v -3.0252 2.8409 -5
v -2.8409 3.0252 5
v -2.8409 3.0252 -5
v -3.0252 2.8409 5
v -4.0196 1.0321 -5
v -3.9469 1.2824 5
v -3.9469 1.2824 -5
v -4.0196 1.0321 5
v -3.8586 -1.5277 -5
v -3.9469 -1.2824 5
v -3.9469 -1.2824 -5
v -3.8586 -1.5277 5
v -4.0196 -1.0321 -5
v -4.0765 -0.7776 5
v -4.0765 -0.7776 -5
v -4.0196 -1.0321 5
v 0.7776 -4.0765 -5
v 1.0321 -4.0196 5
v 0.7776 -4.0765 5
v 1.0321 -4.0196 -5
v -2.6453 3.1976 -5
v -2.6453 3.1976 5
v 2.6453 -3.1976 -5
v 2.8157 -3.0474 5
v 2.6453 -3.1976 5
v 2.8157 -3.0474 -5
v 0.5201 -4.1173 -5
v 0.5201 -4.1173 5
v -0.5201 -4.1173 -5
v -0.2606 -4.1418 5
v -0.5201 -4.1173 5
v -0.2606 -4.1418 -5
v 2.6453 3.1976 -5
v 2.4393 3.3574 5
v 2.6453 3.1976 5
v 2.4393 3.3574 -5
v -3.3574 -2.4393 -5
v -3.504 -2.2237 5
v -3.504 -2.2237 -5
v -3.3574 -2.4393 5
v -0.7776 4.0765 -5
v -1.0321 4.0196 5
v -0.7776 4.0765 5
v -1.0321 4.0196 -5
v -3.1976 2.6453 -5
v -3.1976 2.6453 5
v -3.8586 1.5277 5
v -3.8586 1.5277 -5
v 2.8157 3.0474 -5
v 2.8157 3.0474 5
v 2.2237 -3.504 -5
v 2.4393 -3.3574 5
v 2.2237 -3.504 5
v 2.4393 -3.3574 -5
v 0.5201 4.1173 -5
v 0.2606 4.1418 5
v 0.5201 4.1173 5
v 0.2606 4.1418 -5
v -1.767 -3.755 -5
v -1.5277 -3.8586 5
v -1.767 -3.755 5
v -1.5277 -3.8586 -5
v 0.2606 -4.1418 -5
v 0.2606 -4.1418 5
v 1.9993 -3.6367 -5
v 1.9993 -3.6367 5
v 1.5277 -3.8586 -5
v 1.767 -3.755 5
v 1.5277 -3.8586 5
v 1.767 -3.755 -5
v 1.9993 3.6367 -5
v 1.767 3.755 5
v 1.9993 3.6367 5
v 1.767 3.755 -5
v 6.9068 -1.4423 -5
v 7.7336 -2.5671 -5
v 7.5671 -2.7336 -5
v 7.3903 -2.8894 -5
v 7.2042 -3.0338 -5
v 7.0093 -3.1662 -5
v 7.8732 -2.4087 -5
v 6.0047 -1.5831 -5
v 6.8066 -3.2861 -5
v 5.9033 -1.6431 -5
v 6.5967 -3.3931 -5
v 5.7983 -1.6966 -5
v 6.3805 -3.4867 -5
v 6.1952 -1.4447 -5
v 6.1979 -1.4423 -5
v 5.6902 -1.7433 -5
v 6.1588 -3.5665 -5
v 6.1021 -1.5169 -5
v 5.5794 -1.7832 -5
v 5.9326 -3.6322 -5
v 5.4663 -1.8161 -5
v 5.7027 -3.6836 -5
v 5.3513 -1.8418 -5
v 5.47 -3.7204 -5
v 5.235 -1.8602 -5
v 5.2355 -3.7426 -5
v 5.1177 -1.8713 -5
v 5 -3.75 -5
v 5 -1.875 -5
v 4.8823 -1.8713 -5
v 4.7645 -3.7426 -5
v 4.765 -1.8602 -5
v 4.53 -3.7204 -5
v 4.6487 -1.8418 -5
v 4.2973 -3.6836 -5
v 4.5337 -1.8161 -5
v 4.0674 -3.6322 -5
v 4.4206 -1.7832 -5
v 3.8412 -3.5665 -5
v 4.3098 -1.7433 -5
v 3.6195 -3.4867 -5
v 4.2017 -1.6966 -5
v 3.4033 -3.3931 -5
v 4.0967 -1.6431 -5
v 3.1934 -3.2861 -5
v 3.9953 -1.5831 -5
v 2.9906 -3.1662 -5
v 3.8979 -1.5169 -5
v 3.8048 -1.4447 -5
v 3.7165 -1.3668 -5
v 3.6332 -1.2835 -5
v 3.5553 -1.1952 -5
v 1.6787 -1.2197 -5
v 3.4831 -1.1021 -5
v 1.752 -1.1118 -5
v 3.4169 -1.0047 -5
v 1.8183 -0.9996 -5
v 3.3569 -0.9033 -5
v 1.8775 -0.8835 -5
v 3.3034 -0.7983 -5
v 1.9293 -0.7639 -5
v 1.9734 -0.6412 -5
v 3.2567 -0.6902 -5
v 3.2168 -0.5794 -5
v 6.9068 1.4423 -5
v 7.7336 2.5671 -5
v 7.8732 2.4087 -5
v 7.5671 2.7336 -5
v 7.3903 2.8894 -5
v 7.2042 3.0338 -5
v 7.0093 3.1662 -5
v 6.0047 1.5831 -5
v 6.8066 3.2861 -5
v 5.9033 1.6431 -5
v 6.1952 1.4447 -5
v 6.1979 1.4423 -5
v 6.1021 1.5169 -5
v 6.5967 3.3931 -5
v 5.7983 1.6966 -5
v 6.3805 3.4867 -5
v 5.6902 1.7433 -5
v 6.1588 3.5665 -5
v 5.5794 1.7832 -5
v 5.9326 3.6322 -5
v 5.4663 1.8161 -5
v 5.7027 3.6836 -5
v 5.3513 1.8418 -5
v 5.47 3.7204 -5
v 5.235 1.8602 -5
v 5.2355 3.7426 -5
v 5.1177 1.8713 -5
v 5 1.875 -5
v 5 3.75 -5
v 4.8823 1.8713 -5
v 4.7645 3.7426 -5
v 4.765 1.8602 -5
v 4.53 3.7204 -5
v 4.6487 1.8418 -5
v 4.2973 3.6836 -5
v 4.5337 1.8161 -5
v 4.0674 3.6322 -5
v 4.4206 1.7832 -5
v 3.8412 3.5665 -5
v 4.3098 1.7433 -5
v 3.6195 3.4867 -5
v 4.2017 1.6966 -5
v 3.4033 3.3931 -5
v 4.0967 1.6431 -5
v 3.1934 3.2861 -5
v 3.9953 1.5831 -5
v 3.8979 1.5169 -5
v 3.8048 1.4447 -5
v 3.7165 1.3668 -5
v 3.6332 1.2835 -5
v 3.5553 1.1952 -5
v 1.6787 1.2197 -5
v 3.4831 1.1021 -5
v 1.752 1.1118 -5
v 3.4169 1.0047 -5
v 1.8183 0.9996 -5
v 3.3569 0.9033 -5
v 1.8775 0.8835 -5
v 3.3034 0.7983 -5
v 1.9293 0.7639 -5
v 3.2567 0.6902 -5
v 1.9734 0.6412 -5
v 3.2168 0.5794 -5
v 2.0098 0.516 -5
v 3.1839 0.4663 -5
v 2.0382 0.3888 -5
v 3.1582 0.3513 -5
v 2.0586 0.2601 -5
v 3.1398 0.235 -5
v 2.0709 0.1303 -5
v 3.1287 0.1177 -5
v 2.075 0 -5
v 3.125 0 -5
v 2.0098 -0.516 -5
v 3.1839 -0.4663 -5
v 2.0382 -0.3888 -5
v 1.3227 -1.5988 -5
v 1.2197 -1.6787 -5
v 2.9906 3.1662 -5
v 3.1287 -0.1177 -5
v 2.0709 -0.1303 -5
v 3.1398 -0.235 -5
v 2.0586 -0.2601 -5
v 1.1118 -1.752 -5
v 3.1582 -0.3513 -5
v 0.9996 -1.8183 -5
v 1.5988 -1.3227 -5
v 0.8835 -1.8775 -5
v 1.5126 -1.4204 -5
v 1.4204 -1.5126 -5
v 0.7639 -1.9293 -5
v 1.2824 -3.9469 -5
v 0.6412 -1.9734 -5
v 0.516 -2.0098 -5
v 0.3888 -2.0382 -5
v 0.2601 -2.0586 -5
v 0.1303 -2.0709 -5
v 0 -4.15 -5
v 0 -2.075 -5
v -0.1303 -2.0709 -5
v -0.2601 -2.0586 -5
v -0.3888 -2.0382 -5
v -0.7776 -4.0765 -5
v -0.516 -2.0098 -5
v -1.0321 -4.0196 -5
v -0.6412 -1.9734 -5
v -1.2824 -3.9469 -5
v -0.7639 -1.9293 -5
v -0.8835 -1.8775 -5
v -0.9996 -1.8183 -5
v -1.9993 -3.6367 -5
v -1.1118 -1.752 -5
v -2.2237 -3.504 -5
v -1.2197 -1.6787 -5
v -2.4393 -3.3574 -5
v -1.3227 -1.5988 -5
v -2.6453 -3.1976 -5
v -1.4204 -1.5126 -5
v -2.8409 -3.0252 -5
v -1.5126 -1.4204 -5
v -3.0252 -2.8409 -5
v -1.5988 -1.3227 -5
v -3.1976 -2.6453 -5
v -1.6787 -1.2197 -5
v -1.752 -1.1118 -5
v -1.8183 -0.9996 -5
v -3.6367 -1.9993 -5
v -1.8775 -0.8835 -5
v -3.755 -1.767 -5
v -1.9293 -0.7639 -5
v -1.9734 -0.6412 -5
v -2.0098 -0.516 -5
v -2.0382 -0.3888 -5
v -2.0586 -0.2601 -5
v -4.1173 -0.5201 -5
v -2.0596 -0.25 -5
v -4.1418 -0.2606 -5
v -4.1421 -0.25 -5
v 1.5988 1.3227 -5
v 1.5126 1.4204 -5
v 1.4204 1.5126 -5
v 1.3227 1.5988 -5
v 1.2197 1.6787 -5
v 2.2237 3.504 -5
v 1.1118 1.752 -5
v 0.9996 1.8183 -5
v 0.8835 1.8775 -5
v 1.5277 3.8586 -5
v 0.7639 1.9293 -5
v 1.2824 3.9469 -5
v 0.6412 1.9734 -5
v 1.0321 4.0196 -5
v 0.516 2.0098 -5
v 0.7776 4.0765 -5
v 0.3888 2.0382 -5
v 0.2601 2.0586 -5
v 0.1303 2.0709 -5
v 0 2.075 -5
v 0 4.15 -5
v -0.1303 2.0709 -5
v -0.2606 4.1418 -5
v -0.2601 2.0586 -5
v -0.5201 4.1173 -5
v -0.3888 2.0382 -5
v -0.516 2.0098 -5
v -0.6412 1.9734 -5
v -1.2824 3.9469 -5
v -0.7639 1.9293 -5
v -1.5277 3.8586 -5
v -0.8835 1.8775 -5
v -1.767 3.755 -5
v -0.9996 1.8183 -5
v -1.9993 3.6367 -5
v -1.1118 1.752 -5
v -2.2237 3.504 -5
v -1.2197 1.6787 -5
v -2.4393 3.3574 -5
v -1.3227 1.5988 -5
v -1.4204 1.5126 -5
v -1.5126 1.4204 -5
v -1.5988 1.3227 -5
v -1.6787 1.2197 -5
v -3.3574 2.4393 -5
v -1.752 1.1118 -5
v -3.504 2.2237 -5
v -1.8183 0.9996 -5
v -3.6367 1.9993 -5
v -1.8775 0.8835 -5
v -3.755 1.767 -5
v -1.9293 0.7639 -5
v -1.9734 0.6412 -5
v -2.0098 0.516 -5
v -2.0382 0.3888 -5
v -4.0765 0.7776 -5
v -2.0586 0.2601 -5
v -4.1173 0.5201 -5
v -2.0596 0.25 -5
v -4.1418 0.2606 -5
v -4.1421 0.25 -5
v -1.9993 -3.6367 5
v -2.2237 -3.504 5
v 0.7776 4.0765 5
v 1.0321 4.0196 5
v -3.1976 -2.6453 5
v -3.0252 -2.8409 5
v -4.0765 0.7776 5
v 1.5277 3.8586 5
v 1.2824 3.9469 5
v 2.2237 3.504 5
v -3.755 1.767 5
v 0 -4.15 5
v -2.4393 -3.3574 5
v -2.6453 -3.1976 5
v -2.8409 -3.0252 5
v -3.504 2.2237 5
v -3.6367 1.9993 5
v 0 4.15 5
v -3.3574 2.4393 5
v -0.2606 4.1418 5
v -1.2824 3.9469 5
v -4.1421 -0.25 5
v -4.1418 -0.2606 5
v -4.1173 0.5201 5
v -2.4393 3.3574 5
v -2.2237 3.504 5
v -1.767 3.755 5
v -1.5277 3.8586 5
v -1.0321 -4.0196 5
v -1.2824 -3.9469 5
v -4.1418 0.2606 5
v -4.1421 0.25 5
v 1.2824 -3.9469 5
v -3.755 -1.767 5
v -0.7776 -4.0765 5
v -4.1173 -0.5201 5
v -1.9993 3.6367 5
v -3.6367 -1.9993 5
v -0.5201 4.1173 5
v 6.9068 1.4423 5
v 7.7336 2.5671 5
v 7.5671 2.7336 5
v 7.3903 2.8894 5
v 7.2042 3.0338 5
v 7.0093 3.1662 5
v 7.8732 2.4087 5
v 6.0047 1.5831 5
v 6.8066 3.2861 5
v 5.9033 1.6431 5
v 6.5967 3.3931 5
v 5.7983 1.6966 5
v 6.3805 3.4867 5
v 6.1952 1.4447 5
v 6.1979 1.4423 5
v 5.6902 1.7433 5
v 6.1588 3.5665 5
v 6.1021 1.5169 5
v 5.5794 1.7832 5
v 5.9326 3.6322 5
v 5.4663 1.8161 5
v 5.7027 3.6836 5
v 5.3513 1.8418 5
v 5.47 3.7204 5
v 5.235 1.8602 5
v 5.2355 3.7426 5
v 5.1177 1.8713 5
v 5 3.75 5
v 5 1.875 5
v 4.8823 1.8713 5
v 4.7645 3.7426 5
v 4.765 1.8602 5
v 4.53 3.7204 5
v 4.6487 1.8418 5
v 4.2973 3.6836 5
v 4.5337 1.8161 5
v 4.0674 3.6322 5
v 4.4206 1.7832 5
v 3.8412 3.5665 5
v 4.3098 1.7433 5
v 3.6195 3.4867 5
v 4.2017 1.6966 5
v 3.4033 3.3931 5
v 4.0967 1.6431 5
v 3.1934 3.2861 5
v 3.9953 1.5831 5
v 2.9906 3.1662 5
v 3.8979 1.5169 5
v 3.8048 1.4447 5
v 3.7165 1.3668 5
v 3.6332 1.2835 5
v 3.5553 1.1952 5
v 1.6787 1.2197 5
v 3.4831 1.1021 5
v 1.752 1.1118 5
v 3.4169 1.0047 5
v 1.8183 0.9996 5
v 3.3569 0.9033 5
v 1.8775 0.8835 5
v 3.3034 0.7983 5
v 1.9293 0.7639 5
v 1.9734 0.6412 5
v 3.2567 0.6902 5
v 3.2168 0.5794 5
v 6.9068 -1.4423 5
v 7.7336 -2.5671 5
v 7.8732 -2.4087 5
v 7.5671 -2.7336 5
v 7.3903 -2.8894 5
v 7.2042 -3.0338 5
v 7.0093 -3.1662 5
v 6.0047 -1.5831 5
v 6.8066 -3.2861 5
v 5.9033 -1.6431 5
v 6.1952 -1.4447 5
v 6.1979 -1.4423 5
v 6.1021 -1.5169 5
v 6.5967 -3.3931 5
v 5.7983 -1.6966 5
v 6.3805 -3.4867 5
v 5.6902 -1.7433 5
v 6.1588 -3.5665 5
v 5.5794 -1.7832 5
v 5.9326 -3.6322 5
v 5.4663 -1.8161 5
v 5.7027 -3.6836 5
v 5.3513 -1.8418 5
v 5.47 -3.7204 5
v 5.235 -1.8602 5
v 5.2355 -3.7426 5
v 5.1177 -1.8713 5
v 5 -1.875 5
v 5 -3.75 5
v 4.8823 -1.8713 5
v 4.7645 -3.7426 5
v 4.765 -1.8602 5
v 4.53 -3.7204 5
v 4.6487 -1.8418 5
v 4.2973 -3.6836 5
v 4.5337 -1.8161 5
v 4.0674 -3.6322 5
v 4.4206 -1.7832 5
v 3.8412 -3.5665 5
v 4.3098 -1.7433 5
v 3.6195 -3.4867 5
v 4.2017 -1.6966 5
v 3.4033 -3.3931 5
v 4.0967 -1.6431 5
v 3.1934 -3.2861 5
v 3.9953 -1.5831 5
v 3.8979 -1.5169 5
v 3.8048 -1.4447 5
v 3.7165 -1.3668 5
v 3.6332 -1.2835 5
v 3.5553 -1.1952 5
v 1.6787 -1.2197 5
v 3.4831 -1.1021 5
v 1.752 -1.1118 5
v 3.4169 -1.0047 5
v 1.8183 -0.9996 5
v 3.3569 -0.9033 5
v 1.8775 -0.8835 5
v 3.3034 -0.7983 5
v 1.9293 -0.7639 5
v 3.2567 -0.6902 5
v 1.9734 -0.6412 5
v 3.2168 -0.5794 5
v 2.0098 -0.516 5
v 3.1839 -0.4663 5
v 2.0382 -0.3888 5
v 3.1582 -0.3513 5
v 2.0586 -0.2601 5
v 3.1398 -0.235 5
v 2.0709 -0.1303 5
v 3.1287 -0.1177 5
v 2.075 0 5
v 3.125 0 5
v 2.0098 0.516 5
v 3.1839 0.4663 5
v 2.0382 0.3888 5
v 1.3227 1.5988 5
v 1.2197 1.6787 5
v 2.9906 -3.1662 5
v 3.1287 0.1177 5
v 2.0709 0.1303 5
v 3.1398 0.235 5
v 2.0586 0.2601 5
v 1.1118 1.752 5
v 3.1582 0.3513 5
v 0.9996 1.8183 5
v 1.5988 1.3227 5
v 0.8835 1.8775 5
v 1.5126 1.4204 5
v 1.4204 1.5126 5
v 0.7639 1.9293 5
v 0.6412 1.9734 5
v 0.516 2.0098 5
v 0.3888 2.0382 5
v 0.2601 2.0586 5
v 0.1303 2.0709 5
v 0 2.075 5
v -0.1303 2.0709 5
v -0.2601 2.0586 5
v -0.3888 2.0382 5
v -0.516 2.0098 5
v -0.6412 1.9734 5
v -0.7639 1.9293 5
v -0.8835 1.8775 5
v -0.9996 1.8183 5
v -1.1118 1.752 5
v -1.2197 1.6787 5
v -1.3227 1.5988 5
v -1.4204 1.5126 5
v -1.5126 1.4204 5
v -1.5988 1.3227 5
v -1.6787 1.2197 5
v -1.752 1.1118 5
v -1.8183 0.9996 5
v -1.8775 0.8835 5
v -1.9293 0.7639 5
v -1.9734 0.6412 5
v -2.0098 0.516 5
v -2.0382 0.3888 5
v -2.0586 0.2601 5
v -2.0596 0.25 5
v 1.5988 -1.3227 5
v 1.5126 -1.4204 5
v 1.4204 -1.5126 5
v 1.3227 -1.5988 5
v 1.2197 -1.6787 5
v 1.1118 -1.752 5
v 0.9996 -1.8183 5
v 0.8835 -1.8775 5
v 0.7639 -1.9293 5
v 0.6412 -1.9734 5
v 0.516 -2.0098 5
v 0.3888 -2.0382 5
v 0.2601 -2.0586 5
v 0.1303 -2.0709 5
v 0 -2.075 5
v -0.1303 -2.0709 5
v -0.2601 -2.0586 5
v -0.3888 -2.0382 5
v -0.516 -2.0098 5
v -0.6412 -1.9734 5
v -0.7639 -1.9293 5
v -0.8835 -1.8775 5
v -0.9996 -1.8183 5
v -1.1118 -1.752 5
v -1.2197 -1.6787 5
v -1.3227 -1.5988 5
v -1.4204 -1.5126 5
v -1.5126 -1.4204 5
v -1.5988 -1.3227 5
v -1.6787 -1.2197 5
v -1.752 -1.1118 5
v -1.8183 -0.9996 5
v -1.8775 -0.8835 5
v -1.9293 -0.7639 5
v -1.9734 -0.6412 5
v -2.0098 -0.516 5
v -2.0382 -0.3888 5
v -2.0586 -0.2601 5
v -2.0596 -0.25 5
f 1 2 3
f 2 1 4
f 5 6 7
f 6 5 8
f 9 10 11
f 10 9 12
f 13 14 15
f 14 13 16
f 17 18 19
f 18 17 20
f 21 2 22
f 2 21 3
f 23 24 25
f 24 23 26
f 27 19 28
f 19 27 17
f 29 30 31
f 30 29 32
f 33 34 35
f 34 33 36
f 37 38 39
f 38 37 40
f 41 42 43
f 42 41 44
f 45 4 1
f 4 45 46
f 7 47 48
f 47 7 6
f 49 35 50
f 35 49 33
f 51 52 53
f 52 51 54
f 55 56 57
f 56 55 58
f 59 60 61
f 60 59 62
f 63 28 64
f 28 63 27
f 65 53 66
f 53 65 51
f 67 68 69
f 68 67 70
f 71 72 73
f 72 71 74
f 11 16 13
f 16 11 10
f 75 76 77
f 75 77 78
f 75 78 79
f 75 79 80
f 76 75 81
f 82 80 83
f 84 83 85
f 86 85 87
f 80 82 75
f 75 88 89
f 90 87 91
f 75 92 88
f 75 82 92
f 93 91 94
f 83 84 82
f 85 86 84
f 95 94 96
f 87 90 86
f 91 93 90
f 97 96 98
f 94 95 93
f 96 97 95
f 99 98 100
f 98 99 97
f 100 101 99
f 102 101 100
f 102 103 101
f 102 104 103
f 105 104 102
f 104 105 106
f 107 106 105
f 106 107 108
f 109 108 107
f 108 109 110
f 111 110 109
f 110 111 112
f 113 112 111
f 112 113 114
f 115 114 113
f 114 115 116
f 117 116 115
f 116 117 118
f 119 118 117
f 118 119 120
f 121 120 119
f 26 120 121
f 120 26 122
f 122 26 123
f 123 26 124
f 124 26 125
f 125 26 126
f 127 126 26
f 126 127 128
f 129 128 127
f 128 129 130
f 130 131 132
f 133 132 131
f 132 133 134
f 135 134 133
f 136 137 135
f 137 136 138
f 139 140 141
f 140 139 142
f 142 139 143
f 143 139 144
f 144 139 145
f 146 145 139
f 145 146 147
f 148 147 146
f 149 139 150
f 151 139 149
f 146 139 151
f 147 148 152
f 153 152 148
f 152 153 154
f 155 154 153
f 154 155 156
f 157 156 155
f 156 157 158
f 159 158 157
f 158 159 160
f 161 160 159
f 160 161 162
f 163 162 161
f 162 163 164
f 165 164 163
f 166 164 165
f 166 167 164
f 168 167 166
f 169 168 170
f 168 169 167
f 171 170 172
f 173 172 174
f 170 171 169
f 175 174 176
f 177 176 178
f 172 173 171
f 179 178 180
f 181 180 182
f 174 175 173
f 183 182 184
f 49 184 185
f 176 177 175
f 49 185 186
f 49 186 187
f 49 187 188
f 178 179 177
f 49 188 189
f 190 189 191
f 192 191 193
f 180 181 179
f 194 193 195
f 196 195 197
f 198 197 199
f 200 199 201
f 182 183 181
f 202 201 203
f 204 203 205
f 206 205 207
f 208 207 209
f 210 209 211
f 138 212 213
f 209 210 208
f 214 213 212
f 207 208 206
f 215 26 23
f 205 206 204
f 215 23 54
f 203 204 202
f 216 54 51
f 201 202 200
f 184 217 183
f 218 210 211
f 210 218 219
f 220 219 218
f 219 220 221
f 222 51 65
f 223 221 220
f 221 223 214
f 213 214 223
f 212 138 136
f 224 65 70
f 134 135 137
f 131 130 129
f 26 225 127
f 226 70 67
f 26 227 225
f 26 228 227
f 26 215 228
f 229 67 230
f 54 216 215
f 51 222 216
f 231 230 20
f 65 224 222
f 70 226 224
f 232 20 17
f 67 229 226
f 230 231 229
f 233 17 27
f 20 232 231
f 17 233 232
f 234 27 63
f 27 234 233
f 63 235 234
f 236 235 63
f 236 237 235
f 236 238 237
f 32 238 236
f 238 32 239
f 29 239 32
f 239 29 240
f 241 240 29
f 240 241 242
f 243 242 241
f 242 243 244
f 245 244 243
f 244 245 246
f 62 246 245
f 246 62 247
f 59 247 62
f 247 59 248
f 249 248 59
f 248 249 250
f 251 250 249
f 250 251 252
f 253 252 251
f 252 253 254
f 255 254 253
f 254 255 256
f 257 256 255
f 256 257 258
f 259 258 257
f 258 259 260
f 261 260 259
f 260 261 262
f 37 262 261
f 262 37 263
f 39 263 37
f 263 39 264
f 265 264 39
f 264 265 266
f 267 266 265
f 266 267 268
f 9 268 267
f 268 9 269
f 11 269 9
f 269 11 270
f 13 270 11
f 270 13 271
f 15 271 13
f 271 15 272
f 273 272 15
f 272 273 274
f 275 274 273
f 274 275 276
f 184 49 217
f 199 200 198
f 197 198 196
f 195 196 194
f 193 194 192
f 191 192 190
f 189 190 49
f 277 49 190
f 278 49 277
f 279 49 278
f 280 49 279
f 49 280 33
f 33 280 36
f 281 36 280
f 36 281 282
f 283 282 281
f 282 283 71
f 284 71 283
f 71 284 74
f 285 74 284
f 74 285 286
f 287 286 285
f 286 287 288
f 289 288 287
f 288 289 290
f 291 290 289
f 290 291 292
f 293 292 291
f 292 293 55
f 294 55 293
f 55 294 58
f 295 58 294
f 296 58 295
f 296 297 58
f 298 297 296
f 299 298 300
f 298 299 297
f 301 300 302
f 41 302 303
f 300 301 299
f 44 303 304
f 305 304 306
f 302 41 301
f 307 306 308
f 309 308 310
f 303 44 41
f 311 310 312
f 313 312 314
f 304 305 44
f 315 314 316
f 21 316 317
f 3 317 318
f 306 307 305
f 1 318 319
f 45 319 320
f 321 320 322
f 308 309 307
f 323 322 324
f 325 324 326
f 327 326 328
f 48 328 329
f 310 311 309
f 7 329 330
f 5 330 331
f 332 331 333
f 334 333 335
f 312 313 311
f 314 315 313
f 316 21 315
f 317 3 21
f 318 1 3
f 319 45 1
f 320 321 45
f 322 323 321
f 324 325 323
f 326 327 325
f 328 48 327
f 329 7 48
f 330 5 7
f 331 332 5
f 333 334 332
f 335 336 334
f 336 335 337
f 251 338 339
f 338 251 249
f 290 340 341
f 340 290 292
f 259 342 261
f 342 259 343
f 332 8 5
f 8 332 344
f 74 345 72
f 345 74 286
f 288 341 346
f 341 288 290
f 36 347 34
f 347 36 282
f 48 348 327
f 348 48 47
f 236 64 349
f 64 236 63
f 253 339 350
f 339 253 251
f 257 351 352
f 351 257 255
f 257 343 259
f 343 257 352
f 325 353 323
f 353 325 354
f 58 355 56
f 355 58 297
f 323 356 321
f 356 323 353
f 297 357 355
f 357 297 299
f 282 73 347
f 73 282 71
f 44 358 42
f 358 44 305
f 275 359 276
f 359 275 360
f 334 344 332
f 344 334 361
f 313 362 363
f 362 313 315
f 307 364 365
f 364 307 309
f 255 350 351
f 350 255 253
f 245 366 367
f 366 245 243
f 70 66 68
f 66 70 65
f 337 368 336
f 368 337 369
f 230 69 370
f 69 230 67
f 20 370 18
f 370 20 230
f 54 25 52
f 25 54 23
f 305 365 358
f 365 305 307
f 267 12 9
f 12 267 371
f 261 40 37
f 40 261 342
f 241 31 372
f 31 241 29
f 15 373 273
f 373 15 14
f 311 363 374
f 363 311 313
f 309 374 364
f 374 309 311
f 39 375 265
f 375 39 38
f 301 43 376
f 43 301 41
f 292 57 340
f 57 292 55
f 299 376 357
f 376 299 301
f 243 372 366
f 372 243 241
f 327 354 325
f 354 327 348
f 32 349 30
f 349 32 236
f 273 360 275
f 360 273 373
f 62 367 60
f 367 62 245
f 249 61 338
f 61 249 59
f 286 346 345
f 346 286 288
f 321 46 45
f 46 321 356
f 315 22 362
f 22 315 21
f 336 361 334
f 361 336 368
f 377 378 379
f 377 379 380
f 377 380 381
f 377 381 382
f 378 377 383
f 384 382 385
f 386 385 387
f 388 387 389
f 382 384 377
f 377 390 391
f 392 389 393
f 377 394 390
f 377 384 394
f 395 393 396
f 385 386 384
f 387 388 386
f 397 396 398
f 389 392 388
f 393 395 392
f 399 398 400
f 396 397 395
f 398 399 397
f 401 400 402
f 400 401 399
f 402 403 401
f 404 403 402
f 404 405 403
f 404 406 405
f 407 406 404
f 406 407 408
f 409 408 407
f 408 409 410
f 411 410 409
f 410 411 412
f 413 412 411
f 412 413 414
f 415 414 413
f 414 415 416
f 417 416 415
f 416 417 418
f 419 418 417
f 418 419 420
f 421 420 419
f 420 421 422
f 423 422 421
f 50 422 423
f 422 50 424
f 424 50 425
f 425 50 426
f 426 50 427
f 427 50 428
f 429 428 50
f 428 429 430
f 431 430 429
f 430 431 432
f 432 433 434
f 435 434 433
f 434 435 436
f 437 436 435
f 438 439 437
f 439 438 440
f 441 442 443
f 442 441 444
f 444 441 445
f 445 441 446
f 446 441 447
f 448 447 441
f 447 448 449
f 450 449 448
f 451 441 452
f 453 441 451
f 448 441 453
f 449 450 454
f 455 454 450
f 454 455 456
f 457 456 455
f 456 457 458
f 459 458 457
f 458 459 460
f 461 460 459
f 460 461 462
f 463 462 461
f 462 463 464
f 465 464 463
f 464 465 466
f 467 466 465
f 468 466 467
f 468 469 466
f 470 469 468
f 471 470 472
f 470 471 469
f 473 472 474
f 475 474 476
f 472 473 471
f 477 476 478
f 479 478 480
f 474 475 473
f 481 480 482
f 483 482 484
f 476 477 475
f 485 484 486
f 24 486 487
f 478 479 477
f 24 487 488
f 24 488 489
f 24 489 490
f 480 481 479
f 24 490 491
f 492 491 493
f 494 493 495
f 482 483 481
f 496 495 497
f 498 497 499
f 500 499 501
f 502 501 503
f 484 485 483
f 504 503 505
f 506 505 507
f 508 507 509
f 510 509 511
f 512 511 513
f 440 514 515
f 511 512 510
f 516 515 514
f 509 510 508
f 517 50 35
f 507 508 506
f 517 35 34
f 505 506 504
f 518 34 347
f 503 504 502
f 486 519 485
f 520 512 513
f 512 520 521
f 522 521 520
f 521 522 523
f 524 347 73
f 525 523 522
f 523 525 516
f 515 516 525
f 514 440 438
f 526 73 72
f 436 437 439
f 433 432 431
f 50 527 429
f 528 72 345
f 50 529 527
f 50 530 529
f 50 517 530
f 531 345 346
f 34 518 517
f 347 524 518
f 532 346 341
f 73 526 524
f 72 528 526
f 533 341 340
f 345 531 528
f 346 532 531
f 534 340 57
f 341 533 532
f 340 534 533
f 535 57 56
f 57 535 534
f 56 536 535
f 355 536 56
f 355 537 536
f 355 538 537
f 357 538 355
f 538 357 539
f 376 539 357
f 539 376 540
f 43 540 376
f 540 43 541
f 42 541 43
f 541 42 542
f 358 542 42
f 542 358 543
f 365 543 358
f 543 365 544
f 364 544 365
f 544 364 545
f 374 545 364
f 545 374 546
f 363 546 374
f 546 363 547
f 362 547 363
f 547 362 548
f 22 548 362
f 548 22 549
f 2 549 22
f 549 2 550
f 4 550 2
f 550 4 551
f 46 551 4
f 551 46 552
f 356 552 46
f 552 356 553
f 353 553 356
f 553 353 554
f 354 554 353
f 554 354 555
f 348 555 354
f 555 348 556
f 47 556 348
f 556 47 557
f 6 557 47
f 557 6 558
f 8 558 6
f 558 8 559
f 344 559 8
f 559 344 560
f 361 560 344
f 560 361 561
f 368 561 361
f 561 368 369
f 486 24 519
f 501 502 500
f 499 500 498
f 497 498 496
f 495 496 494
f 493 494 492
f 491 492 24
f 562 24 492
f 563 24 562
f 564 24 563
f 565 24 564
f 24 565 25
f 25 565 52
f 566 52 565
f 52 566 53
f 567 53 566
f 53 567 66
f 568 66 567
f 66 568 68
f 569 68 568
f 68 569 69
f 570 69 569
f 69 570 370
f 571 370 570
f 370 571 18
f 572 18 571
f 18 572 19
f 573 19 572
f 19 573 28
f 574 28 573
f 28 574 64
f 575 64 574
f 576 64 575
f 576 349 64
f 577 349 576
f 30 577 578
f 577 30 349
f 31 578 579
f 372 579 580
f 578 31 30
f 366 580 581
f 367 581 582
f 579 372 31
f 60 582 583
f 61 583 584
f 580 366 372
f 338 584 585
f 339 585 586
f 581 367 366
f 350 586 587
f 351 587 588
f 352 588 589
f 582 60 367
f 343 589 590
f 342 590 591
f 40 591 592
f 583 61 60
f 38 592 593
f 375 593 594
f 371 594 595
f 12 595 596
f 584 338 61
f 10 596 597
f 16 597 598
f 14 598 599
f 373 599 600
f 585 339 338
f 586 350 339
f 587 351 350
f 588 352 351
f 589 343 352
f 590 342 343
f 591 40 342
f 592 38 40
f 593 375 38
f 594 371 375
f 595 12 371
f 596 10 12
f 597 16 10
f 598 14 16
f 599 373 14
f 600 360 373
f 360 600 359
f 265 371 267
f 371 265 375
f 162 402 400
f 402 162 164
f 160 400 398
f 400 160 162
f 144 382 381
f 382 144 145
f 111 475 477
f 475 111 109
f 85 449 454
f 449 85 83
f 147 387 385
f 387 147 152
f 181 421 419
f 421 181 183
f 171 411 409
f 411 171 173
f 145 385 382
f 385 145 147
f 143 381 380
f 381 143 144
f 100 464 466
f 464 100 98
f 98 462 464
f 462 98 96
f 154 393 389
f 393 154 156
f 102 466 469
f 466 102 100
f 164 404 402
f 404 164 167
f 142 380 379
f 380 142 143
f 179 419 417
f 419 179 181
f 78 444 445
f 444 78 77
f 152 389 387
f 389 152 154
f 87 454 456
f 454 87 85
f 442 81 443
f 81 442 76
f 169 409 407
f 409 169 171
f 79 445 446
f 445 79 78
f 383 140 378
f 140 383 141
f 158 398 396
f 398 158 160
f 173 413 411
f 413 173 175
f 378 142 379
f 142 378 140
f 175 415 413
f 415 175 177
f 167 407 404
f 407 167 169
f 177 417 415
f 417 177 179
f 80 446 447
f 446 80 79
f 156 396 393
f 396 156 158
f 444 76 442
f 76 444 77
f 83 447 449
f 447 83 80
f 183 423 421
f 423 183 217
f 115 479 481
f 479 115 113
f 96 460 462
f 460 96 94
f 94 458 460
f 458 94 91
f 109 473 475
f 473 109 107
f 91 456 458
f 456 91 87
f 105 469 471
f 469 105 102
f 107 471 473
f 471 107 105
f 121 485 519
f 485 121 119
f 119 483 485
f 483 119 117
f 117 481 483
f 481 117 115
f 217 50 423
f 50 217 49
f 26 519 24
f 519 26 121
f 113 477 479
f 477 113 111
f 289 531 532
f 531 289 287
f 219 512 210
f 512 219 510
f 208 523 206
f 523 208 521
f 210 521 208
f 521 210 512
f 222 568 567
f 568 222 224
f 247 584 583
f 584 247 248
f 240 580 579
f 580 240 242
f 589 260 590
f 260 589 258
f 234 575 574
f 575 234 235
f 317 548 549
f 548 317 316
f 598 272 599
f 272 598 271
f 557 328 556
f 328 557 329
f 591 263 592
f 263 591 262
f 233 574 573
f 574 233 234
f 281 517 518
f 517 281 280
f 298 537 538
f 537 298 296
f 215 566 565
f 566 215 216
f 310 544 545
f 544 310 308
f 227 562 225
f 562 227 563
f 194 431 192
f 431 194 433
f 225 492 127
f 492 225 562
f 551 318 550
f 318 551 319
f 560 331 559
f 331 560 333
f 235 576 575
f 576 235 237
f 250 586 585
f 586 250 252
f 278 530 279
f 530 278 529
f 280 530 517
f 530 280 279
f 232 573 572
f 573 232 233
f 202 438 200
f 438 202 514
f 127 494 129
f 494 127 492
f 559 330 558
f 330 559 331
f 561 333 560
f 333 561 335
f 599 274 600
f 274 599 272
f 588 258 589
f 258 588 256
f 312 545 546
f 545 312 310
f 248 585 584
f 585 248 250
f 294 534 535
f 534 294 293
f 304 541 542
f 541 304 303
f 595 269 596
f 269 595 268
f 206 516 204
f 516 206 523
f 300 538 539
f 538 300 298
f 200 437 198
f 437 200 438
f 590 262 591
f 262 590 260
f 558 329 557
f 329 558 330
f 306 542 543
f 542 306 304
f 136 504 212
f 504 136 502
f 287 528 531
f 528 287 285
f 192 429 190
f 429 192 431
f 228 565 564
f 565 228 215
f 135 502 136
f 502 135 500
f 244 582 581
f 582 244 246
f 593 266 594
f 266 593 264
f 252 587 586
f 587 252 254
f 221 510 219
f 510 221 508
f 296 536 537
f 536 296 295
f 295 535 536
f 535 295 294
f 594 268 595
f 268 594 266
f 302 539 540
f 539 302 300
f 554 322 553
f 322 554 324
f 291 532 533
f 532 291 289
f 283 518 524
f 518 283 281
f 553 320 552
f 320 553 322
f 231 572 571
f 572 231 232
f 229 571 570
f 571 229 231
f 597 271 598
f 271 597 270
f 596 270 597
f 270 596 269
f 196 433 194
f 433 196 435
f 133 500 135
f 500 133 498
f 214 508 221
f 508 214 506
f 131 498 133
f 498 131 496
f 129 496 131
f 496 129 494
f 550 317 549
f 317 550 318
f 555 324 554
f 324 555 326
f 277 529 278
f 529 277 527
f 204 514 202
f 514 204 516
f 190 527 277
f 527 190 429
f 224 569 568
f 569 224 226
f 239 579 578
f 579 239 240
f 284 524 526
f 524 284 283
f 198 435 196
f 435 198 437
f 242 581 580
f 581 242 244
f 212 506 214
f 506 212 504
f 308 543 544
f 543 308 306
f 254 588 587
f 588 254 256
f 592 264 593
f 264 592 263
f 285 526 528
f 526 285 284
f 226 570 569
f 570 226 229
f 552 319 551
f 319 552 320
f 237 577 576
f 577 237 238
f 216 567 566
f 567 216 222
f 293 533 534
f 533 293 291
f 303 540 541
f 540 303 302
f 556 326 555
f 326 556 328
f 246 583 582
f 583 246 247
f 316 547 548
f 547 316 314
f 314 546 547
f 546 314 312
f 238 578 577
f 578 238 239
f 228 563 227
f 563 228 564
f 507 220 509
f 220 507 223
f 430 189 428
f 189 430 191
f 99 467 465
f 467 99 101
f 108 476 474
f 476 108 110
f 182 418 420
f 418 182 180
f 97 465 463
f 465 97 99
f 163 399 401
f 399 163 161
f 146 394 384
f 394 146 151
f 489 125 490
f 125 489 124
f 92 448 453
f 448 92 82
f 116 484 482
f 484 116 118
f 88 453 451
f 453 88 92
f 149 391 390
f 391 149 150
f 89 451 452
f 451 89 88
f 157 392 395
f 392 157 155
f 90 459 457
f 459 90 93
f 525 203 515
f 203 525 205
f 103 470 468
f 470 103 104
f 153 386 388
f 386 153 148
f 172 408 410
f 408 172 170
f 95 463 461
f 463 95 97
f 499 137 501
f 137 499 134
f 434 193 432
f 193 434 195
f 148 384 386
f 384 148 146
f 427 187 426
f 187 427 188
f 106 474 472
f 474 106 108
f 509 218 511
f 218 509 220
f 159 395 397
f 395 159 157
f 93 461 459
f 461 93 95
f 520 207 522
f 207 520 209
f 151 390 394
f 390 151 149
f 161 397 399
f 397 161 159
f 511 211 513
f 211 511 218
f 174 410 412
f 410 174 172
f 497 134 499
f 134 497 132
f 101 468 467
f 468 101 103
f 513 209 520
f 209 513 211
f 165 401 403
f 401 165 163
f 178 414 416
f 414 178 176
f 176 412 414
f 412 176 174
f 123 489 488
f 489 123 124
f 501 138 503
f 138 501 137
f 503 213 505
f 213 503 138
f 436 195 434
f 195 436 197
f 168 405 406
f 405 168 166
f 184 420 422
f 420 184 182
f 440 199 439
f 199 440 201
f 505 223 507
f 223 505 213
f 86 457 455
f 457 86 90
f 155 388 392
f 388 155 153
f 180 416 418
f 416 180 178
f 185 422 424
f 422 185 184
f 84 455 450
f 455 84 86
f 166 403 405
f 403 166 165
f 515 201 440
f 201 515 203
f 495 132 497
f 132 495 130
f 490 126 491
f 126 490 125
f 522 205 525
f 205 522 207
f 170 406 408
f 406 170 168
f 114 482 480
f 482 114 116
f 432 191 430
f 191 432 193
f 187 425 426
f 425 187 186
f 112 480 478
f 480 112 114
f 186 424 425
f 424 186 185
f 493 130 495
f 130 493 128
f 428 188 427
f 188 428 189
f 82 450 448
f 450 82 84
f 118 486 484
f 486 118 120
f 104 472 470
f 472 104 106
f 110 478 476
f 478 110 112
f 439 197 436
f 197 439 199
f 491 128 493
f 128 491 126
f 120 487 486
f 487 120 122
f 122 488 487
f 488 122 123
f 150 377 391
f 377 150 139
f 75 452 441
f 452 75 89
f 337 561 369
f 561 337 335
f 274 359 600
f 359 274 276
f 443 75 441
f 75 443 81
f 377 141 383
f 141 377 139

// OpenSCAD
/*
cable-clips for cable-pipe
*/
$fn = 100;

cable_pipe_diameter = 4.15;
audio_cable_diameter = 3.75;

difference() {
    union() {
        translate([0, 0, 0]) {
             cylinder(h=10, r=cable_pipe_diameter, center=true);
        }
        translate([5, 0, 0]) {
            cylinder(h=10, r=audio_cable_diameter, center=true);
        }
    }
    translate([0, 0, 0]) {
         cylinder(h=12, r=cable_pipe_diameter/2, center=true);
    }
    translate([5, 0, 0]) {
         cylinder(h=12, r=audio_cable_diameter/2, center=true);
    }
    translate([10, 0, 0]) {
         cube([10, audio_cable_diameter/1.3, 12], center=true);
    }
    translate([-5, 0, 0]) {
         cube([10, .5, 12], center=true);
    }
    translate([9 ,0 ,0]) {
        rotate([0, 0, 45]) {
            cube([5, 5, 12], center=true);
        }
    }
}
